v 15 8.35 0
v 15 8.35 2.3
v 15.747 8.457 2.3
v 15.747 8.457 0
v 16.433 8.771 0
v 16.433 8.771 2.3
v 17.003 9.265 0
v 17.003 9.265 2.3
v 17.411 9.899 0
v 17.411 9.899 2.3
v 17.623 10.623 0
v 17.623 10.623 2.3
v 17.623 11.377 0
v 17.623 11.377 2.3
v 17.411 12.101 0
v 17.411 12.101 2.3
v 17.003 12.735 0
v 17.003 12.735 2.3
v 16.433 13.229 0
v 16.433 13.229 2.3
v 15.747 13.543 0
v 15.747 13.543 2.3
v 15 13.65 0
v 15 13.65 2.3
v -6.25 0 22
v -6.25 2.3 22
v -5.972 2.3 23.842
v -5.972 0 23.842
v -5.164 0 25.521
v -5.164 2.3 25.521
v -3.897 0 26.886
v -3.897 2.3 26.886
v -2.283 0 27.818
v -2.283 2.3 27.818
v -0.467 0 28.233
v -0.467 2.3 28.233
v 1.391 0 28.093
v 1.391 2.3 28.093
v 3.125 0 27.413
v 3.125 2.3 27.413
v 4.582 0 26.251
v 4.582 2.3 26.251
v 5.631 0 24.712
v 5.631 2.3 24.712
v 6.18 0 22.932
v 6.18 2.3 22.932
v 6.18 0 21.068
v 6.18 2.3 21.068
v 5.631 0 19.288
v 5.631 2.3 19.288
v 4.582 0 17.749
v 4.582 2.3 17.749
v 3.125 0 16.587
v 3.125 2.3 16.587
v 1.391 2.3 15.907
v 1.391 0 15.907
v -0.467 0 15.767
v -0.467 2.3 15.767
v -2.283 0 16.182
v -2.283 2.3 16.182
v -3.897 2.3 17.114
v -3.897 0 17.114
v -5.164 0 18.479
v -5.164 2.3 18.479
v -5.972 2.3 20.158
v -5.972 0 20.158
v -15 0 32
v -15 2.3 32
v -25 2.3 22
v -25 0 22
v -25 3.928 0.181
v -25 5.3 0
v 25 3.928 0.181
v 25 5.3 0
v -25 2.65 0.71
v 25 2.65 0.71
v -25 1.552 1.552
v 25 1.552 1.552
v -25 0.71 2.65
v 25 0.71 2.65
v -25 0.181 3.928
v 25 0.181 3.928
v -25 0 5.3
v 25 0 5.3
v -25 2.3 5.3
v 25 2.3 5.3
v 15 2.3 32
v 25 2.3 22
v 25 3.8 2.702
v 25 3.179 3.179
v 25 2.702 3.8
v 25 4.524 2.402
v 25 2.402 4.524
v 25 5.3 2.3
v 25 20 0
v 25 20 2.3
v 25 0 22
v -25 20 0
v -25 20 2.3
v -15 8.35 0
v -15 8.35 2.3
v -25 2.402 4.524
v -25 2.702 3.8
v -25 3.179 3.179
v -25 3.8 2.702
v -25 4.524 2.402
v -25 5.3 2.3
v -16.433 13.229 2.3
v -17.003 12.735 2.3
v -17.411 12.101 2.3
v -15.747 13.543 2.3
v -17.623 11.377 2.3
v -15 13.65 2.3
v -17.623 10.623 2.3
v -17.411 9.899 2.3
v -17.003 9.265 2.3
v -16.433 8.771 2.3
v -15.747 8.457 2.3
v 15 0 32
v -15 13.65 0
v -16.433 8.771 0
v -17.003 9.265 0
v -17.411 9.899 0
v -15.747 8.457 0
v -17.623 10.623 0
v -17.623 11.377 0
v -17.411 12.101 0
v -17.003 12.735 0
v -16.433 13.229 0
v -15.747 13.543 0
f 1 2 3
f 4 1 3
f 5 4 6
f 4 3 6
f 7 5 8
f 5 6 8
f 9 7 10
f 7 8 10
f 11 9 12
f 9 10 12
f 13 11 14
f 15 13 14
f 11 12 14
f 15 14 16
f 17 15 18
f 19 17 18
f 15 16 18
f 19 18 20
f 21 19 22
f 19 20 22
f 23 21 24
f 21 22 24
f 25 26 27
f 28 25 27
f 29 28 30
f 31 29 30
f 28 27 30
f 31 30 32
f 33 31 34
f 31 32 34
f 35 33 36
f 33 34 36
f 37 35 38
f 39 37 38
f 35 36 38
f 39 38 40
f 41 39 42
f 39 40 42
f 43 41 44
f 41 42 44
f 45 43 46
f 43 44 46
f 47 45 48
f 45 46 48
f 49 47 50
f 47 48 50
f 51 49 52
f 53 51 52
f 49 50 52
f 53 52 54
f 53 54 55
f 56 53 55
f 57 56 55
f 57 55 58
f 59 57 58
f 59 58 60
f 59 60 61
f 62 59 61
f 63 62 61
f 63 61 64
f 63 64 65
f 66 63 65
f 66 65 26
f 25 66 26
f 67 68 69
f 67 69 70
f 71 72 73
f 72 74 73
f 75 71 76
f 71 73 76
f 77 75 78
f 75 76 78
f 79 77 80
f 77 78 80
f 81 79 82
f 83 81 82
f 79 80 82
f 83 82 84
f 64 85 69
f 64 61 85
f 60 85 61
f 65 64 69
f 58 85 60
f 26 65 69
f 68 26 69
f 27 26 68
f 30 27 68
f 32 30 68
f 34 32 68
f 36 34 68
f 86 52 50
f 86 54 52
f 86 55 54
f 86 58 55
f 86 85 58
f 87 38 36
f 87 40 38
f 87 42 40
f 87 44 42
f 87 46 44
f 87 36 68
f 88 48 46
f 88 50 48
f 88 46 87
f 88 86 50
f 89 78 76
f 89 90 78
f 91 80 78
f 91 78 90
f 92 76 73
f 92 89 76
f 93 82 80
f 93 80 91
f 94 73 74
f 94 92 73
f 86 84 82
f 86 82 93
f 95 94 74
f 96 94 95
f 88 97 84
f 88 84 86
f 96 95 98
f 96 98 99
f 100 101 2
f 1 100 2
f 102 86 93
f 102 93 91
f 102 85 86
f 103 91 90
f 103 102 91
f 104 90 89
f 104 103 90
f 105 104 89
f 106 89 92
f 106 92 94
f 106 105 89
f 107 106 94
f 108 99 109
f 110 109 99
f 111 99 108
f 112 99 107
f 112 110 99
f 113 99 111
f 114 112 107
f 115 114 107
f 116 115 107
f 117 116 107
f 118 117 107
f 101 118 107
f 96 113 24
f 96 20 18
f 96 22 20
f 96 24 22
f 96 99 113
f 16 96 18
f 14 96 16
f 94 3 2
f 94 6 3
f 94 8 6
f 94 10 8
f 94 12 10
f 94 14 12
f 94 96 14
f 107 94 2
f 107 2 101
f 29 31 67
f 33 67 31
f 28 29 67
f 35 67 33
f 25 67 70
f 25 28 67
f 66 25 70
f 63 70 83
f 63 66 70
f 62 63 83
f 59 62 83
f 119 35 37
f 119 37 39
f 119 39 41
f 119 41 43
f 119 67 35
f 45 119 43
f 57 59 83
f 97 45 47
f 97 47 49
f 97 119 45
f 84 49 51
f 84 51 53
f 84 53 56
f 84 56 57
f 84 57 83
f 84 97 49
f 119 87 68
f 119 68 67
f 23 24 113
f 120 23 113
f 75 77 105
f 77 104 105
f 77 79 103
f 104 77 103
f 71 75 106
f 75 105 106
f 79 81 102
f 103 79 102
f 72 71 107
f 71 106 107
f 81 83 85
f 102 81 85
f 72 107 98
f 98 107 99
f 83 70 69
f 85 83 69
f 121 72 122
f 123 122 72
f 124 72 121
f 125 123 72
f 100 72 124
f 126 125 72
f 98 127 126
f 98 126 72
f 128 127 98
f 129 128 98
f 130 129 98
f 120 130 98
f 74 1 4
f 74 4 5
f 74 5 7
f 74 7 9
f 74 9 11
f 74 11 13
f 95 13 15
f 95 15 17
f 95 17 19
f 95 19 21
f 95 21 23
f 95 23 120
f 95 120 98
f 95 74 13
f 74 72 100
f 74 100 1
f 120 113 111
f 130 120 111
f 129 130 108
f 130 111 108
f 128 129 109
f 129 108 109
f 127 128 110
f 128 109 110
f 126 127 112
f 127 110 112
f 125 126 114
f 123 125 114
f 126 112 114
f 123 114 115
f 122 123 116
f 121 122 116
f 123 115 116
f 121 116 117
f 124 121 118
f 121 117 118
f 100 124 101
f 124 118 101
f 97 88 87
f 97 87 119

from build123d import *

# Parameters (mm, degrees)
F1_DEPTH      = 25
F1_DEPTH_BACK = 25
F4_DEPTH      = 2.301
F5_R          = 3
F6_R          = 5.3
F7_D          = 12.5
F8_SIZE       = 10


with BuildPart() as f1:
    # F0 (on Right) → F1 (new body, two sides)
    with BuildSketch(Plane.YZ) as f1_sk:
        Polygon((2.3, 32), (0, 32), (0, 0), (20, 0), (20, 2.3), (2.3, 2.3), align=None)
    extrude(amount=F1_DEPTH)
    extrude(f1_sk.sketch, amount=-F1_DEPTH_BACK)

    # F3 (on face) → F4 (cut, through all)
    with BuildSketch(Plane.XY.offset(2.3)):
        with BuildLine():
            Line((-15, 8.35), (15, 8.35))
            ThreePointArc((15, 8.35), (17.65, 11), (15, 13.65))
            Line((15, 13.65), (-15, 13.65))
            ThreePointArc((-15, 13.65), (-17.65, 11), (-15, 8.35))
        make_face()
    extrude(amount=-F4_DEPTH, mode=Mode.SUBTRACT)

    # F5
    f5_edges = [f1.edges().sort_by_distance(p)[0] for p in [
        (0, 2.3, 2.3),
    ]]
    fillet(f5_edges, radius=F5_R)

    # F6
    f6_edges = [f1.edges().sort_by_distance(p)[0] for p in [
        (0, 0, 0),
    ]]
    fillet(f6_edges, radius=F6_R)

    # F7 (through all)
    with Locations(Plane.XZ):
        with Locations((0, 22)):
            Hole(F7_D / 2)

    # F8
    f8_edges = [f1.edges().sort_by_distance(p)[0] for p in [
        (25, 1.15, 32),
        (-25, 1.15, 32),
    ]]
    chamfer(f8_edges, length=F8_SIZE)


solid = f1.part
